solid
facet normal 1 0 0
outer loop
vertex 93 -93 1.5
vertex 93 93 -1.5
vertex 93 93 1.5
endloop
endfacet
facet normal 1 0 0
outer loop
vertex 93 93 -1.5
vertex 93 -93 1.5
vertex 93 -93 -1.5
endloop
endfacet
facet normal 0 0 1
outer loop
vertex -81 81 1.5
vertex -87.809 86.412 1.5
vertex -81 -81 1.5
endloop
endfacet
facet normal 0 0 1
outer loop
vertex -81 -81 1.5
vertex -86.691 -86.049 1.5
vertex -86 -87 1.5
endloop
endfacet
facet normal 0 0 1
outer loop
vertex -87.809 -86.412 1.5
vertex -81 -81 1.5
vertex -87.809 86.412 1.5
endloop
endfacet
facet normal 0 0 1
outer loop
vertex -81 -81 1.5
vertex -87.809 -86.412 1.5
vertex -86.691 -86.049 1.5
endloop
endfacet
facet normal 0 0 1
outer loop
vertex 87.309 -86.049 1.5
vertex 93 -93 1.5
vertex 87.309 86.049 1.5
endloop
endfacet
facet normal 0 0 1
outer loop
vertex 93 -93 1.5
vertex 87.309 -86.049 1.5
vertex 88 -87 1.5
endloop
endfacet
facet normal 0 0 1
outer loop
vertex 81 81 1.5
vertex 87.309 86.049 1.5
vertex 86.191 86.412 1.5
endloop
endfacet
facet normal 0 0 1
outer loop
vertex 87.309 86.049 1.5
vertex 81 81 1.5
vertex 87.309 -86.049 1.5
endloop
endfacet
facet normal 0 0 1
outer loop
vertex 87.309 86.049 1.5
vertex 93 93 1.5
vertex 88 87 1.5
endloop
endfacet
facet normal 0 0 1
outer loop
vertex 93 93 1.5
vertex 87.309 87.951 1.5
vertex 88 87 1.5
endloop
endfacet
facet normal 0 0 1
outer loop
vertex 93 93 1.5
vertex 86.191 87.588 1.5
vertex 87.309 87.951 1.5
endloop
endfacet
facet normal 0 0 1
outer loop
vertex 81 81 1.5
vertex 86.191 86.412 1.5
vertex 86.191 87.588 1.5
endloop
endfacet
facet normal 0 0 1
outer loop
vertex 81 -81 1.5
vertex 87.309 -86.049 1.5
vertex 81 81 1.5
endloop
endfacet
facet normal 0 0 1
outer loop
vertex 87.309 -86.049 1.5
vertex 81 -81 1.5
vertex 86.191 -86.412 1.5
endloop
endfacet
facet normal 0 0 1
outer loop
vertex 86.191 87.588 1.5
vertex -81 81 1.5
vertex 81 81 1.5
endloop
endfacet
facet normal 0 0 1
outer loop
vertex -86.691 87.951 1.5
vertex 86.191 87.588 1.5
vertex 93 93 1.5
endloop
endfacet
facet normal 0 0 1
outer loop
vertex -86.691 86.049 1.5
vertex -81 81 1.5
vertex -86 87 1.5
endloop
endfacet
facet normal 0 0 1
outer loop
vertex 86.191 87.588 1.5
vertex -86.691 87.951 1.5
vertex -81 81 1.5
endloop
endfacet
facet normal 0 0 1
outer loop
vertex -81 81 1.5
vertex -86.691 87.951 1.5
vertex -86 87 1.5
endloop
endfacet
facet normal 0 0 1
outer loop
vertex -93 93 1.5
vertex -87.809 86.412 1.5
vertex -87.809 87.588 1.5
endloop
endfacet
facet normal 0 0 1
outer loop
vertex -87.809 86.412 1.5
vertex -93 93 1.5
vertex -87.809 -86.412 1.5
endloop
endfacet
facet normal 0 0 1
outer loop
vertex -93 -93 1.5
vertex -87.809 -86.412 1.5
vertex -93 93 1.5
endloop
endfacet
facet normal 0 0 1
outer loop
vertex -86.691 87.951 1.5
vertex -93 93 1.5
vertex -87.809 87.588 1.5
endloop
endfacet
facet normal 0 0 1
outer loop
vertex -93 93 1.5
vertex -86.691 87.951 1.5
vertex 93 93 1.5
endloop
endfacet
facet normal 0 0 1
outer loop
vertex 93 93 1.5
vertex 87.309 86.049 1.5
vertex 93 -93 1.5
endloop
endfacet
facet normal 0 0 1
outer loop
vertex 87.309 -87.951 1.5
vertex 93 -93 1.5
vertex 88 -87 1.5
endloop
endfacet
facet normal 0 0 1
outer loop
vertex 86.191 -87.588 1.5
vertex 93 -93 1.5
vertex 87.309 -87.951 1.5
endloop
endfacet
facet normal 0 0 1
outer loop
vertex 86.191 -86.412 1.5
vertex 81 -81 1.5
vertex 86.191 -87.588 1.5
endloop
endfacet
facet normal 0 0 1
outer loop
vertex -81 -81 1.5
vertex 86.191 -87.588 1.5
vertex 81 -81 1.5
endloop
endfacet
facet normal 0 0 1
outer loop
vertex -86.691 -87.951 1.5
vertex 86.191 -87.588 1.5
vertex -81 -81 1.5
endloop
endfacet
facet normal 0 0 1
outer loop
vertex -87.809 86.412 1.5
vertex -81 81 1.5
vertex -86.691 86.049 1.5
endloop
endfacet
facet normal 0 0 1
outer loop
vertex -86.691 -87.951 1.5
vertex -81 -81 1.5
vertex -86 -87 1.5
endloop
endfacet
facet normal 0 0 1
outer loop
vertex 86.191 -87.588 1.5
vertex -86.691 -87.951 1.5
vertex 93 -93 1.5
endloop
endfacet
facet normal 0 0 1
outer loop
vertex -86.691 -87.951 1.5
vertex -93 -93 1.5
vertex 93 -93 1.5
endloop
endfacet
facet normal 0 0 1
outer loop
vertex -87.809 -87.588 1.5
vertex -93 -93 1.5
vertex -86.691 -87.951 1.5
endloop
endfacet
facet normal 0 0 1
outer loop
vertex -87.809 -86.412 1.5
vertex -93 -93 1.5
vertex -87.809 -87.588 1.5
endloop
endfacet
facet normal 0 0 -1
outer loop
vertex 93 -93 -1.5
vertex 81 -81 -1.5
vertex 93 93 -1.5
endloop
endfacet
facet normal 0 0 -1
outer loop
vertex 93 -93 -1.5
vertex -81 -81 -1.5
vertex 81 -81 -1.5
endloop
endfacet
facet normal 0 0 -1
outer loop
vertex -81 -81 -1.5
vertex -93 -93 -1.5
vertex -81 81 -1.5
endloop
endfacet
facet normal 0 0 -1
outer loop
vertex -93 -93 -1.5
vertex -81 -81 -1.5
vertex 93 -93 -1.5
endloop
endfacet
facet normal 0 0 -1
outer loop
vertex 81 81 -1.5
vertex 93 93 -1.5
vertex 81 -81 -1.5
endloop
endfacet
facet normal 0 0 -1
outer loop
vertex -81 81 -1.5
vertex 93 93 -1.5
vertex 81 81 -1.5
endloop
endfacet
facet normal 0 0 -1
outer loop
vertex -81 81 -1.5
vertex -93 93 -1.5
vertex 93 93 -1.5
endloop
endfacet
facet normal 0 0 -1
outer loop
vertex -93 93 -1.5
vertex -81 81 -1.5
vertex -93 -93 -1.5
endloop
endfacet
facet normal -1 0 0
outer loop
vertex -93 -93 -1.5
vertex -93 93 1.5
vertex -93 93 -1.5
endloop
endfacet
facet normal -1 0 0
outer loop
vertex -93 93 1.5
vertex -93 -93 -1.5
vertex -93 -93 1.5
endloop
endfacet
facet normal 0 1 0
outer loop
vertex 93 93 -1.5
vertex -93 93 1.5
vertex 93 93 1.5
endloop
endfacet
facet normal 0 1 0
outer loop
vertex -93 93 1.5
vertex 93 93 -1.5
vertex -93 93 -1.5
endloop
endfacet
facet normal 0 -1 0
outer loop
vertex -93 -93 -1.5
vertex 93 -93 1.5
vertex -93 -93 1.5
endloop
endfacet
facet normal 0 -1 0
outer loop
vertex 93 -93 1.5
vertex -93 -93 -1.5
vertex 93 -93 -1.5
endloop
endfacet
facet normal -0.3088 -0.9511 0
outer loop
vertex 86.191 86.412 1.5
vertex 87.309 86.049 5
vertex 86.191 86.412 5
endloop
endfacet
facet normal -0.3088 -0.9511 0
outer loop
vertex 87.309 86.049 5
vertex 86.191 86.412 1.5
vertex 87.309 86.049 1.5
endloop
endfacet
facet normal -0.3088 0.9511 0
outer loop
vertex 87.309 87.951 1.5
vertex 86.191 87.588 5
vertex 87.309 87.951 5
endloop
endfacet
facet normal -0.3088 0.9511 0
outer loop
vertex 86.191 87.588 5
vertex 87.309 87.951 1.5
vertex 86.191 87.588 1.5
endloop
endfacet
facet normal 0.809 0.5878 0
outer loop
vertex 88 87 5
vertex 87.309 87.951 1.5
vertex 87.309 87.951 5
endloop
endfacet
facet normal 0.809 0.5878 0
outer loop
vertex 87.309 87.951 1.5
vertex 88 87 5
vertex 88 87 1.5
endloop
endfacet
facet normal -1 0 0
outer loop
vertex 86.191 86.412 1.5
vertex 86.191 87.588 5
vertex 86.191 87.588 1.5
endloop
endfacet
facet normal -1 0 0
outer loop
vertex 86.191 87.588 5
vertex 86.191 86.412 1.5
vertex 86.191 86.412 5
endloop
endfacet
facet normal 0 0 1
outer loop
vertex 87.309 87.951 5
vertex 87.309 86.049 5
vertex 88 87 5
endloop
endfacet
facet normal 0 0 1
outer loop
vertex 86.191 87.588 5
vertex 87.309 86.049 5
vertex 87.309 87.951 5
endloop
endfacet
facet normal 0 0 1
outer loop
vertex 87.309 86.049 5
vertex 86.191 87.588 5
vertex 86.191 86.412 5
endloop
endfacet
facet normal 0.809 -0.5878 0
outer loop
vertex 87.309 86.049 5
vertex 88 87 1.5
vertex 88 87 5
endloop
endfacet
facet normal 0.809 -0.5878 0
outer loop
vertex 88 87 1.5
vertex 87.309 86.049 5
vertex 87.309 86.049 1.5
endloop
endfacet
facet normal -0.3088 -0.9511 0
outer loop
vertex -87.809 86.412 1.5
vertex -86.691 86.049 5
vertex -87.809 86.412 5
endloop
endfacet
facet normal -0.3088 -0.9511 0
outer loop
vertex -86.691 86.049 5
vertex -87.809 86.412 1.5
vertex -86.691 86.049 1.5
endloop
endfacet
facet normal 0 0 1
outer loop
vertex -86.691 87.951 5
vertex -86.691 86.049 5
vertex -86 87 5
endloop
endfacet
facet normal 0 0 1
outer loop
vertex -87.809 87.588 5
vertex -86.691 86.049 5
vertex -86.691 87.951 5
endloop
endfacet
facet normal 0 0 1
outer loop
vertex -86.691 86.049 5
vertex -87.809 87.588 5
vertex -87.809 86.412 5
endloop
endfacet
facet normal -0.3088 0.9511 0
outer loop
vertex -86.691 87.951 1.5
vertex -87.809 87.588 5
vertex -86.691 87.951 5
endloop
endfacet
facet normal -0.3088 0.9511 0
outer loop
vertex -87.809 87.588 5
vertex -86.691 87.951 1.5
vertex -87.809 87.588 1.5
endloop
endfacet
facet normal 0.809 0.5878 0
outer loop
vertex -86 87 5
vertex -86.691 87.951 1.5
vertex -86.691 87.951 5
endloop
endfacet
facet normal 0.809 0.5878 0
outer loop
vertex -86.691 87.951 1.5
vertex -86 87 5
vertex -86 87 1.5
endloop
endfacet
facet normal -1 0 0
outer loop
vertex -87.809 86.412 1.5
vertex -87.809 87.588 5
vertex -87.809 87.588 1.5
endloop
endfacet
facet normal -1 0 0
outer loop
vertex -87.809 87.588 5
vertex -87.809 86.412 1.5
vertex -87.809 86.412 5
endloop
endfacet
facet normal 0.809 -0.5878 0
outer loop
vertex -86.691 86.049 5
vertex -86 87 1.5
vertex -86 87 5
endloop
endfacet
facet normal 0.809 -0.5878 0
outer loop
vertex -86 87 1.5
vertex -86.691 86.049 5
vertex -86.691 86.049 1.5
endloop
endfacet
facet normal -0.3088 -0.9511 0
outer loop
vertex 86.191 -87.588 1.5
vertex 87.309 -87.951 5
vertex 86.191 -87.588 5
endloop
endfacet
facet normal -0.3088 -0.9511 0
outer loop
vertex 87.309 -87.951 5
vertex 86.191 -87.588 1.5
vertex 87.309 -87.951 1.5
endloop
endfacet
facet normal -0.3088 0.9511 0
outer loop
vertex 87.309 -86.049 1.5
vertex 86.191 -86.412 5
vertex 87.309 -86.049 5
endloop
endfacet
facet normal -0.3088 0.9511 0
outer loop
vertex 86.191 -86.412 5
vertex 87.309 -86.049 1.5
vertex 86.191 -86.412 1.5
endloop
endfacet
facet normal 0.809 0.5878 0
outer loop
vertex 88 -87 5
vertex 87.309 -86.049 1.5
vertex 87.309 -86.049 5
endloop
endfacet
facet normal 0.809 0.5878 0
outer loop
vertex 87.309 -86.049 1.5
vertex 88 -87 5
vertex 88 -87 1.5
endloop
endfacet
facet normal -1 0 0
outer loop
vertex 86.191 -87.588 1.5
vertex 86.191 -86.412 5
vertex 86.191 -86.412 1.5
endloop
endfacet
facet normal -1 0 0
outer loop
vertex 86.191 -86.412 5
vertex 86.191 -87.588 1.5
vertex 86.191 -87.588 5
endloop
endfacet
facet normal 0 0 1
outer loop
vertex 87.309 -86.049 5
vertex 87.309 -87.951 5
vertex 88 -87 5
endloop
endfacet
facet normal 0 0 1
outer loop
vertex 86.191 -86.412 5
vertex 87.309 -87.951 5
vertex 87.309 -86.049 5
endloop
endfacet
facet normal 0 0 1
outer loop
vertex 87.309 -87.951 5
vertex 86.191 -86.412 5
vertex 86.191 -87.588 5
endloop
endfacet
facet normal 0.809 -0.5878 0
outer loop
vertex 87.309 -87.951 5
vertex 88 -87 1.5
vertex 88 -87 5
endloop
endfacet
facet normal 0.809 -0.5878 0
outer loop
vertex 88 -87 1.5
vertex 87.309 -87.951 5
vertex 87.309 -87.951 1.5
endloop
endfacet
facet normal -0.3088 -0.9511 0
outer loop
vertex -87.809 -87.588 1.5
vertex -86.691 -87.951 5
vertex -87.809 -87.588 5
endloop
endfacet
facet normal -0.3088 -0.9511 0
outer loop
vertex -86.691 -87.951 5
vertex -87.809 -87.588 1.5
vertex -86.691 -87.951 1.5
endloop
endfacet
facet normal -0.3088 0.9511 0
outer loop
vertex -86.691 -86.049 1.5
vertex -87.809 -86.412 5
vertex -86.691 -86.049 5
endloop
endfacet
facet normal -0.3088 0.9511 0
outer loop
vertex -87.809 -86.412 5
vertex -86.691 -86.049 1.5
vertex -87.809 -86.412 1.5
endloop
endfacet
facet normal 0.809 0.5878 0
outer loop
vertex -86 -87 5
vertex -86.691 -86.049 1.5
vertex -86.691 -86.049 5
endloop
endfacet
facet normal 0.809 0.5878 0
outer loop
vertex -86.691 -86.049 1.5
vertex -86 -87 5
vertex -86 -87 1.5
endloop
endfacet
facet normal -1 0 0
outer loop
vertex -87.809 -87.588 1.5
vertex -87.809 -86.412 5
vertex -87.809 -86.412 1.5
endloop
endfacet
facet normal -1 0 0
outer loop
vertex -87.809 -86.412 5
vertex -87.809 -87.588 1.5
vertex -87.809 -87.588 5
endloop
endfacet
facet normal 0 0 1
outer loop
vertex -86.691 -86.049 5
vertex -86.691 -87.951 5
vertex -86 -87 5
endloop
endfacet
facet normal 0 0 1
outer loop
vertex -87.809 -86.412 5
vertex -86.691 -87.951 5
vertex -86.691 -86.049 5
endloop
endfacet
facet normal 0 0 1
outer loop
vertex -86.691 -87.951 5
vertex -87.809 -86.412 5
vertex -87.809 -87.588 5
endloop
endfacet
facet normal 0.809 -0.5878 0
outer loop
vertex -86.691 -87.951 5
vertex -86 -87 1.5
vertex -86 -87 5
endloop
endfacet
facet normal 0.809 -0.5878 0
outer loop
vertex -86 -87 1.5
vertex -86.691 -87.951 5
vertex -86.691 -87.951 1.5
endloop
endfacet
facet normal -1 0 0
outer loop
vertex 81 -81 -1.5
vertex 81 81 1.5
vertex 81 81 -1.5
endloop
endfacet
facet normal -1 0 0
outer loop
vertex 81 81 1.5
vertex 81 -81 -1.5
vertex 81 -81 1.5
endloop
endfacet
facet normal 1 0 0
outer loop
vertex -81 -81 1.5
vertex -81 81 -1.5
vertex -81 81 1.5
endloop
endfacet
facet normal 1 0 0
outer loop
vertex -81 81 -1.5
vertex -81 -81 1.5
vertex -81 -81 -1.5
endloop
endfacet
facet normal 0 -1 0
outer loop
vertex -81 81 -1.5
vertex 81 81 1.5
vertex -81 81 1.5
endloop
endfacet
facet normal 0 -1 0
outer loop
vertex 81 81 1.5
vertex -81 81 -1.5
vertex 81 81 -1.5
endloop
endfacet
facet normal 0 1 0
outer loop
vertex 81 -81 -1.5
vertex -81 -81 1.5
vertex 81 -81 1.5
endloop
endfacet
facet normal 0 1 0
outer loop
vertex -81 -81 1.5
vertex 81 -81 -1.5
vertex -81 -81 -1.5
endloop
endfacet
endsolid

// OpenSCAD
frameLength = 186;
frameWidth = 186;
frameHeight = 3;
frameInset = 12;

pinHeight = 4;
pinDiameter = 2;

pinX = (frameWidth / 2) - (frameInset / 2);
pinY = (frameLength / 2 - (frameInset / 2));
pinZ = frameHeight - 2;

difference() {
    // outer frame with pins
    union() {
        cube(size=[frameWidth, frameLength, frameHeight], center=true);
        
        translate([pinX, pinY, pinZ]) 
        cylinder(h=pinHeight, d=pinDiameter);
        
        translate([-pinX, pinY, pinZ]) 
        cylinder(h=pinHeight, d=pinDiameter);
        
        translate([pinX, -pinY, pinZ]) 
        cylinder(h=pinHeight, d=pinDiameter);
        
        translate([-pinX, -pinY, pinZ]) 
        cylinder(h=pinHeight, d=pinDiameter);
    }
    
    // cut out the center
    cube(size=[frameWidth - (frameInset * 2), 
            frameLength - (frameInset * 2), 
            frameHeight + 1], 
        center=true
    );
}
